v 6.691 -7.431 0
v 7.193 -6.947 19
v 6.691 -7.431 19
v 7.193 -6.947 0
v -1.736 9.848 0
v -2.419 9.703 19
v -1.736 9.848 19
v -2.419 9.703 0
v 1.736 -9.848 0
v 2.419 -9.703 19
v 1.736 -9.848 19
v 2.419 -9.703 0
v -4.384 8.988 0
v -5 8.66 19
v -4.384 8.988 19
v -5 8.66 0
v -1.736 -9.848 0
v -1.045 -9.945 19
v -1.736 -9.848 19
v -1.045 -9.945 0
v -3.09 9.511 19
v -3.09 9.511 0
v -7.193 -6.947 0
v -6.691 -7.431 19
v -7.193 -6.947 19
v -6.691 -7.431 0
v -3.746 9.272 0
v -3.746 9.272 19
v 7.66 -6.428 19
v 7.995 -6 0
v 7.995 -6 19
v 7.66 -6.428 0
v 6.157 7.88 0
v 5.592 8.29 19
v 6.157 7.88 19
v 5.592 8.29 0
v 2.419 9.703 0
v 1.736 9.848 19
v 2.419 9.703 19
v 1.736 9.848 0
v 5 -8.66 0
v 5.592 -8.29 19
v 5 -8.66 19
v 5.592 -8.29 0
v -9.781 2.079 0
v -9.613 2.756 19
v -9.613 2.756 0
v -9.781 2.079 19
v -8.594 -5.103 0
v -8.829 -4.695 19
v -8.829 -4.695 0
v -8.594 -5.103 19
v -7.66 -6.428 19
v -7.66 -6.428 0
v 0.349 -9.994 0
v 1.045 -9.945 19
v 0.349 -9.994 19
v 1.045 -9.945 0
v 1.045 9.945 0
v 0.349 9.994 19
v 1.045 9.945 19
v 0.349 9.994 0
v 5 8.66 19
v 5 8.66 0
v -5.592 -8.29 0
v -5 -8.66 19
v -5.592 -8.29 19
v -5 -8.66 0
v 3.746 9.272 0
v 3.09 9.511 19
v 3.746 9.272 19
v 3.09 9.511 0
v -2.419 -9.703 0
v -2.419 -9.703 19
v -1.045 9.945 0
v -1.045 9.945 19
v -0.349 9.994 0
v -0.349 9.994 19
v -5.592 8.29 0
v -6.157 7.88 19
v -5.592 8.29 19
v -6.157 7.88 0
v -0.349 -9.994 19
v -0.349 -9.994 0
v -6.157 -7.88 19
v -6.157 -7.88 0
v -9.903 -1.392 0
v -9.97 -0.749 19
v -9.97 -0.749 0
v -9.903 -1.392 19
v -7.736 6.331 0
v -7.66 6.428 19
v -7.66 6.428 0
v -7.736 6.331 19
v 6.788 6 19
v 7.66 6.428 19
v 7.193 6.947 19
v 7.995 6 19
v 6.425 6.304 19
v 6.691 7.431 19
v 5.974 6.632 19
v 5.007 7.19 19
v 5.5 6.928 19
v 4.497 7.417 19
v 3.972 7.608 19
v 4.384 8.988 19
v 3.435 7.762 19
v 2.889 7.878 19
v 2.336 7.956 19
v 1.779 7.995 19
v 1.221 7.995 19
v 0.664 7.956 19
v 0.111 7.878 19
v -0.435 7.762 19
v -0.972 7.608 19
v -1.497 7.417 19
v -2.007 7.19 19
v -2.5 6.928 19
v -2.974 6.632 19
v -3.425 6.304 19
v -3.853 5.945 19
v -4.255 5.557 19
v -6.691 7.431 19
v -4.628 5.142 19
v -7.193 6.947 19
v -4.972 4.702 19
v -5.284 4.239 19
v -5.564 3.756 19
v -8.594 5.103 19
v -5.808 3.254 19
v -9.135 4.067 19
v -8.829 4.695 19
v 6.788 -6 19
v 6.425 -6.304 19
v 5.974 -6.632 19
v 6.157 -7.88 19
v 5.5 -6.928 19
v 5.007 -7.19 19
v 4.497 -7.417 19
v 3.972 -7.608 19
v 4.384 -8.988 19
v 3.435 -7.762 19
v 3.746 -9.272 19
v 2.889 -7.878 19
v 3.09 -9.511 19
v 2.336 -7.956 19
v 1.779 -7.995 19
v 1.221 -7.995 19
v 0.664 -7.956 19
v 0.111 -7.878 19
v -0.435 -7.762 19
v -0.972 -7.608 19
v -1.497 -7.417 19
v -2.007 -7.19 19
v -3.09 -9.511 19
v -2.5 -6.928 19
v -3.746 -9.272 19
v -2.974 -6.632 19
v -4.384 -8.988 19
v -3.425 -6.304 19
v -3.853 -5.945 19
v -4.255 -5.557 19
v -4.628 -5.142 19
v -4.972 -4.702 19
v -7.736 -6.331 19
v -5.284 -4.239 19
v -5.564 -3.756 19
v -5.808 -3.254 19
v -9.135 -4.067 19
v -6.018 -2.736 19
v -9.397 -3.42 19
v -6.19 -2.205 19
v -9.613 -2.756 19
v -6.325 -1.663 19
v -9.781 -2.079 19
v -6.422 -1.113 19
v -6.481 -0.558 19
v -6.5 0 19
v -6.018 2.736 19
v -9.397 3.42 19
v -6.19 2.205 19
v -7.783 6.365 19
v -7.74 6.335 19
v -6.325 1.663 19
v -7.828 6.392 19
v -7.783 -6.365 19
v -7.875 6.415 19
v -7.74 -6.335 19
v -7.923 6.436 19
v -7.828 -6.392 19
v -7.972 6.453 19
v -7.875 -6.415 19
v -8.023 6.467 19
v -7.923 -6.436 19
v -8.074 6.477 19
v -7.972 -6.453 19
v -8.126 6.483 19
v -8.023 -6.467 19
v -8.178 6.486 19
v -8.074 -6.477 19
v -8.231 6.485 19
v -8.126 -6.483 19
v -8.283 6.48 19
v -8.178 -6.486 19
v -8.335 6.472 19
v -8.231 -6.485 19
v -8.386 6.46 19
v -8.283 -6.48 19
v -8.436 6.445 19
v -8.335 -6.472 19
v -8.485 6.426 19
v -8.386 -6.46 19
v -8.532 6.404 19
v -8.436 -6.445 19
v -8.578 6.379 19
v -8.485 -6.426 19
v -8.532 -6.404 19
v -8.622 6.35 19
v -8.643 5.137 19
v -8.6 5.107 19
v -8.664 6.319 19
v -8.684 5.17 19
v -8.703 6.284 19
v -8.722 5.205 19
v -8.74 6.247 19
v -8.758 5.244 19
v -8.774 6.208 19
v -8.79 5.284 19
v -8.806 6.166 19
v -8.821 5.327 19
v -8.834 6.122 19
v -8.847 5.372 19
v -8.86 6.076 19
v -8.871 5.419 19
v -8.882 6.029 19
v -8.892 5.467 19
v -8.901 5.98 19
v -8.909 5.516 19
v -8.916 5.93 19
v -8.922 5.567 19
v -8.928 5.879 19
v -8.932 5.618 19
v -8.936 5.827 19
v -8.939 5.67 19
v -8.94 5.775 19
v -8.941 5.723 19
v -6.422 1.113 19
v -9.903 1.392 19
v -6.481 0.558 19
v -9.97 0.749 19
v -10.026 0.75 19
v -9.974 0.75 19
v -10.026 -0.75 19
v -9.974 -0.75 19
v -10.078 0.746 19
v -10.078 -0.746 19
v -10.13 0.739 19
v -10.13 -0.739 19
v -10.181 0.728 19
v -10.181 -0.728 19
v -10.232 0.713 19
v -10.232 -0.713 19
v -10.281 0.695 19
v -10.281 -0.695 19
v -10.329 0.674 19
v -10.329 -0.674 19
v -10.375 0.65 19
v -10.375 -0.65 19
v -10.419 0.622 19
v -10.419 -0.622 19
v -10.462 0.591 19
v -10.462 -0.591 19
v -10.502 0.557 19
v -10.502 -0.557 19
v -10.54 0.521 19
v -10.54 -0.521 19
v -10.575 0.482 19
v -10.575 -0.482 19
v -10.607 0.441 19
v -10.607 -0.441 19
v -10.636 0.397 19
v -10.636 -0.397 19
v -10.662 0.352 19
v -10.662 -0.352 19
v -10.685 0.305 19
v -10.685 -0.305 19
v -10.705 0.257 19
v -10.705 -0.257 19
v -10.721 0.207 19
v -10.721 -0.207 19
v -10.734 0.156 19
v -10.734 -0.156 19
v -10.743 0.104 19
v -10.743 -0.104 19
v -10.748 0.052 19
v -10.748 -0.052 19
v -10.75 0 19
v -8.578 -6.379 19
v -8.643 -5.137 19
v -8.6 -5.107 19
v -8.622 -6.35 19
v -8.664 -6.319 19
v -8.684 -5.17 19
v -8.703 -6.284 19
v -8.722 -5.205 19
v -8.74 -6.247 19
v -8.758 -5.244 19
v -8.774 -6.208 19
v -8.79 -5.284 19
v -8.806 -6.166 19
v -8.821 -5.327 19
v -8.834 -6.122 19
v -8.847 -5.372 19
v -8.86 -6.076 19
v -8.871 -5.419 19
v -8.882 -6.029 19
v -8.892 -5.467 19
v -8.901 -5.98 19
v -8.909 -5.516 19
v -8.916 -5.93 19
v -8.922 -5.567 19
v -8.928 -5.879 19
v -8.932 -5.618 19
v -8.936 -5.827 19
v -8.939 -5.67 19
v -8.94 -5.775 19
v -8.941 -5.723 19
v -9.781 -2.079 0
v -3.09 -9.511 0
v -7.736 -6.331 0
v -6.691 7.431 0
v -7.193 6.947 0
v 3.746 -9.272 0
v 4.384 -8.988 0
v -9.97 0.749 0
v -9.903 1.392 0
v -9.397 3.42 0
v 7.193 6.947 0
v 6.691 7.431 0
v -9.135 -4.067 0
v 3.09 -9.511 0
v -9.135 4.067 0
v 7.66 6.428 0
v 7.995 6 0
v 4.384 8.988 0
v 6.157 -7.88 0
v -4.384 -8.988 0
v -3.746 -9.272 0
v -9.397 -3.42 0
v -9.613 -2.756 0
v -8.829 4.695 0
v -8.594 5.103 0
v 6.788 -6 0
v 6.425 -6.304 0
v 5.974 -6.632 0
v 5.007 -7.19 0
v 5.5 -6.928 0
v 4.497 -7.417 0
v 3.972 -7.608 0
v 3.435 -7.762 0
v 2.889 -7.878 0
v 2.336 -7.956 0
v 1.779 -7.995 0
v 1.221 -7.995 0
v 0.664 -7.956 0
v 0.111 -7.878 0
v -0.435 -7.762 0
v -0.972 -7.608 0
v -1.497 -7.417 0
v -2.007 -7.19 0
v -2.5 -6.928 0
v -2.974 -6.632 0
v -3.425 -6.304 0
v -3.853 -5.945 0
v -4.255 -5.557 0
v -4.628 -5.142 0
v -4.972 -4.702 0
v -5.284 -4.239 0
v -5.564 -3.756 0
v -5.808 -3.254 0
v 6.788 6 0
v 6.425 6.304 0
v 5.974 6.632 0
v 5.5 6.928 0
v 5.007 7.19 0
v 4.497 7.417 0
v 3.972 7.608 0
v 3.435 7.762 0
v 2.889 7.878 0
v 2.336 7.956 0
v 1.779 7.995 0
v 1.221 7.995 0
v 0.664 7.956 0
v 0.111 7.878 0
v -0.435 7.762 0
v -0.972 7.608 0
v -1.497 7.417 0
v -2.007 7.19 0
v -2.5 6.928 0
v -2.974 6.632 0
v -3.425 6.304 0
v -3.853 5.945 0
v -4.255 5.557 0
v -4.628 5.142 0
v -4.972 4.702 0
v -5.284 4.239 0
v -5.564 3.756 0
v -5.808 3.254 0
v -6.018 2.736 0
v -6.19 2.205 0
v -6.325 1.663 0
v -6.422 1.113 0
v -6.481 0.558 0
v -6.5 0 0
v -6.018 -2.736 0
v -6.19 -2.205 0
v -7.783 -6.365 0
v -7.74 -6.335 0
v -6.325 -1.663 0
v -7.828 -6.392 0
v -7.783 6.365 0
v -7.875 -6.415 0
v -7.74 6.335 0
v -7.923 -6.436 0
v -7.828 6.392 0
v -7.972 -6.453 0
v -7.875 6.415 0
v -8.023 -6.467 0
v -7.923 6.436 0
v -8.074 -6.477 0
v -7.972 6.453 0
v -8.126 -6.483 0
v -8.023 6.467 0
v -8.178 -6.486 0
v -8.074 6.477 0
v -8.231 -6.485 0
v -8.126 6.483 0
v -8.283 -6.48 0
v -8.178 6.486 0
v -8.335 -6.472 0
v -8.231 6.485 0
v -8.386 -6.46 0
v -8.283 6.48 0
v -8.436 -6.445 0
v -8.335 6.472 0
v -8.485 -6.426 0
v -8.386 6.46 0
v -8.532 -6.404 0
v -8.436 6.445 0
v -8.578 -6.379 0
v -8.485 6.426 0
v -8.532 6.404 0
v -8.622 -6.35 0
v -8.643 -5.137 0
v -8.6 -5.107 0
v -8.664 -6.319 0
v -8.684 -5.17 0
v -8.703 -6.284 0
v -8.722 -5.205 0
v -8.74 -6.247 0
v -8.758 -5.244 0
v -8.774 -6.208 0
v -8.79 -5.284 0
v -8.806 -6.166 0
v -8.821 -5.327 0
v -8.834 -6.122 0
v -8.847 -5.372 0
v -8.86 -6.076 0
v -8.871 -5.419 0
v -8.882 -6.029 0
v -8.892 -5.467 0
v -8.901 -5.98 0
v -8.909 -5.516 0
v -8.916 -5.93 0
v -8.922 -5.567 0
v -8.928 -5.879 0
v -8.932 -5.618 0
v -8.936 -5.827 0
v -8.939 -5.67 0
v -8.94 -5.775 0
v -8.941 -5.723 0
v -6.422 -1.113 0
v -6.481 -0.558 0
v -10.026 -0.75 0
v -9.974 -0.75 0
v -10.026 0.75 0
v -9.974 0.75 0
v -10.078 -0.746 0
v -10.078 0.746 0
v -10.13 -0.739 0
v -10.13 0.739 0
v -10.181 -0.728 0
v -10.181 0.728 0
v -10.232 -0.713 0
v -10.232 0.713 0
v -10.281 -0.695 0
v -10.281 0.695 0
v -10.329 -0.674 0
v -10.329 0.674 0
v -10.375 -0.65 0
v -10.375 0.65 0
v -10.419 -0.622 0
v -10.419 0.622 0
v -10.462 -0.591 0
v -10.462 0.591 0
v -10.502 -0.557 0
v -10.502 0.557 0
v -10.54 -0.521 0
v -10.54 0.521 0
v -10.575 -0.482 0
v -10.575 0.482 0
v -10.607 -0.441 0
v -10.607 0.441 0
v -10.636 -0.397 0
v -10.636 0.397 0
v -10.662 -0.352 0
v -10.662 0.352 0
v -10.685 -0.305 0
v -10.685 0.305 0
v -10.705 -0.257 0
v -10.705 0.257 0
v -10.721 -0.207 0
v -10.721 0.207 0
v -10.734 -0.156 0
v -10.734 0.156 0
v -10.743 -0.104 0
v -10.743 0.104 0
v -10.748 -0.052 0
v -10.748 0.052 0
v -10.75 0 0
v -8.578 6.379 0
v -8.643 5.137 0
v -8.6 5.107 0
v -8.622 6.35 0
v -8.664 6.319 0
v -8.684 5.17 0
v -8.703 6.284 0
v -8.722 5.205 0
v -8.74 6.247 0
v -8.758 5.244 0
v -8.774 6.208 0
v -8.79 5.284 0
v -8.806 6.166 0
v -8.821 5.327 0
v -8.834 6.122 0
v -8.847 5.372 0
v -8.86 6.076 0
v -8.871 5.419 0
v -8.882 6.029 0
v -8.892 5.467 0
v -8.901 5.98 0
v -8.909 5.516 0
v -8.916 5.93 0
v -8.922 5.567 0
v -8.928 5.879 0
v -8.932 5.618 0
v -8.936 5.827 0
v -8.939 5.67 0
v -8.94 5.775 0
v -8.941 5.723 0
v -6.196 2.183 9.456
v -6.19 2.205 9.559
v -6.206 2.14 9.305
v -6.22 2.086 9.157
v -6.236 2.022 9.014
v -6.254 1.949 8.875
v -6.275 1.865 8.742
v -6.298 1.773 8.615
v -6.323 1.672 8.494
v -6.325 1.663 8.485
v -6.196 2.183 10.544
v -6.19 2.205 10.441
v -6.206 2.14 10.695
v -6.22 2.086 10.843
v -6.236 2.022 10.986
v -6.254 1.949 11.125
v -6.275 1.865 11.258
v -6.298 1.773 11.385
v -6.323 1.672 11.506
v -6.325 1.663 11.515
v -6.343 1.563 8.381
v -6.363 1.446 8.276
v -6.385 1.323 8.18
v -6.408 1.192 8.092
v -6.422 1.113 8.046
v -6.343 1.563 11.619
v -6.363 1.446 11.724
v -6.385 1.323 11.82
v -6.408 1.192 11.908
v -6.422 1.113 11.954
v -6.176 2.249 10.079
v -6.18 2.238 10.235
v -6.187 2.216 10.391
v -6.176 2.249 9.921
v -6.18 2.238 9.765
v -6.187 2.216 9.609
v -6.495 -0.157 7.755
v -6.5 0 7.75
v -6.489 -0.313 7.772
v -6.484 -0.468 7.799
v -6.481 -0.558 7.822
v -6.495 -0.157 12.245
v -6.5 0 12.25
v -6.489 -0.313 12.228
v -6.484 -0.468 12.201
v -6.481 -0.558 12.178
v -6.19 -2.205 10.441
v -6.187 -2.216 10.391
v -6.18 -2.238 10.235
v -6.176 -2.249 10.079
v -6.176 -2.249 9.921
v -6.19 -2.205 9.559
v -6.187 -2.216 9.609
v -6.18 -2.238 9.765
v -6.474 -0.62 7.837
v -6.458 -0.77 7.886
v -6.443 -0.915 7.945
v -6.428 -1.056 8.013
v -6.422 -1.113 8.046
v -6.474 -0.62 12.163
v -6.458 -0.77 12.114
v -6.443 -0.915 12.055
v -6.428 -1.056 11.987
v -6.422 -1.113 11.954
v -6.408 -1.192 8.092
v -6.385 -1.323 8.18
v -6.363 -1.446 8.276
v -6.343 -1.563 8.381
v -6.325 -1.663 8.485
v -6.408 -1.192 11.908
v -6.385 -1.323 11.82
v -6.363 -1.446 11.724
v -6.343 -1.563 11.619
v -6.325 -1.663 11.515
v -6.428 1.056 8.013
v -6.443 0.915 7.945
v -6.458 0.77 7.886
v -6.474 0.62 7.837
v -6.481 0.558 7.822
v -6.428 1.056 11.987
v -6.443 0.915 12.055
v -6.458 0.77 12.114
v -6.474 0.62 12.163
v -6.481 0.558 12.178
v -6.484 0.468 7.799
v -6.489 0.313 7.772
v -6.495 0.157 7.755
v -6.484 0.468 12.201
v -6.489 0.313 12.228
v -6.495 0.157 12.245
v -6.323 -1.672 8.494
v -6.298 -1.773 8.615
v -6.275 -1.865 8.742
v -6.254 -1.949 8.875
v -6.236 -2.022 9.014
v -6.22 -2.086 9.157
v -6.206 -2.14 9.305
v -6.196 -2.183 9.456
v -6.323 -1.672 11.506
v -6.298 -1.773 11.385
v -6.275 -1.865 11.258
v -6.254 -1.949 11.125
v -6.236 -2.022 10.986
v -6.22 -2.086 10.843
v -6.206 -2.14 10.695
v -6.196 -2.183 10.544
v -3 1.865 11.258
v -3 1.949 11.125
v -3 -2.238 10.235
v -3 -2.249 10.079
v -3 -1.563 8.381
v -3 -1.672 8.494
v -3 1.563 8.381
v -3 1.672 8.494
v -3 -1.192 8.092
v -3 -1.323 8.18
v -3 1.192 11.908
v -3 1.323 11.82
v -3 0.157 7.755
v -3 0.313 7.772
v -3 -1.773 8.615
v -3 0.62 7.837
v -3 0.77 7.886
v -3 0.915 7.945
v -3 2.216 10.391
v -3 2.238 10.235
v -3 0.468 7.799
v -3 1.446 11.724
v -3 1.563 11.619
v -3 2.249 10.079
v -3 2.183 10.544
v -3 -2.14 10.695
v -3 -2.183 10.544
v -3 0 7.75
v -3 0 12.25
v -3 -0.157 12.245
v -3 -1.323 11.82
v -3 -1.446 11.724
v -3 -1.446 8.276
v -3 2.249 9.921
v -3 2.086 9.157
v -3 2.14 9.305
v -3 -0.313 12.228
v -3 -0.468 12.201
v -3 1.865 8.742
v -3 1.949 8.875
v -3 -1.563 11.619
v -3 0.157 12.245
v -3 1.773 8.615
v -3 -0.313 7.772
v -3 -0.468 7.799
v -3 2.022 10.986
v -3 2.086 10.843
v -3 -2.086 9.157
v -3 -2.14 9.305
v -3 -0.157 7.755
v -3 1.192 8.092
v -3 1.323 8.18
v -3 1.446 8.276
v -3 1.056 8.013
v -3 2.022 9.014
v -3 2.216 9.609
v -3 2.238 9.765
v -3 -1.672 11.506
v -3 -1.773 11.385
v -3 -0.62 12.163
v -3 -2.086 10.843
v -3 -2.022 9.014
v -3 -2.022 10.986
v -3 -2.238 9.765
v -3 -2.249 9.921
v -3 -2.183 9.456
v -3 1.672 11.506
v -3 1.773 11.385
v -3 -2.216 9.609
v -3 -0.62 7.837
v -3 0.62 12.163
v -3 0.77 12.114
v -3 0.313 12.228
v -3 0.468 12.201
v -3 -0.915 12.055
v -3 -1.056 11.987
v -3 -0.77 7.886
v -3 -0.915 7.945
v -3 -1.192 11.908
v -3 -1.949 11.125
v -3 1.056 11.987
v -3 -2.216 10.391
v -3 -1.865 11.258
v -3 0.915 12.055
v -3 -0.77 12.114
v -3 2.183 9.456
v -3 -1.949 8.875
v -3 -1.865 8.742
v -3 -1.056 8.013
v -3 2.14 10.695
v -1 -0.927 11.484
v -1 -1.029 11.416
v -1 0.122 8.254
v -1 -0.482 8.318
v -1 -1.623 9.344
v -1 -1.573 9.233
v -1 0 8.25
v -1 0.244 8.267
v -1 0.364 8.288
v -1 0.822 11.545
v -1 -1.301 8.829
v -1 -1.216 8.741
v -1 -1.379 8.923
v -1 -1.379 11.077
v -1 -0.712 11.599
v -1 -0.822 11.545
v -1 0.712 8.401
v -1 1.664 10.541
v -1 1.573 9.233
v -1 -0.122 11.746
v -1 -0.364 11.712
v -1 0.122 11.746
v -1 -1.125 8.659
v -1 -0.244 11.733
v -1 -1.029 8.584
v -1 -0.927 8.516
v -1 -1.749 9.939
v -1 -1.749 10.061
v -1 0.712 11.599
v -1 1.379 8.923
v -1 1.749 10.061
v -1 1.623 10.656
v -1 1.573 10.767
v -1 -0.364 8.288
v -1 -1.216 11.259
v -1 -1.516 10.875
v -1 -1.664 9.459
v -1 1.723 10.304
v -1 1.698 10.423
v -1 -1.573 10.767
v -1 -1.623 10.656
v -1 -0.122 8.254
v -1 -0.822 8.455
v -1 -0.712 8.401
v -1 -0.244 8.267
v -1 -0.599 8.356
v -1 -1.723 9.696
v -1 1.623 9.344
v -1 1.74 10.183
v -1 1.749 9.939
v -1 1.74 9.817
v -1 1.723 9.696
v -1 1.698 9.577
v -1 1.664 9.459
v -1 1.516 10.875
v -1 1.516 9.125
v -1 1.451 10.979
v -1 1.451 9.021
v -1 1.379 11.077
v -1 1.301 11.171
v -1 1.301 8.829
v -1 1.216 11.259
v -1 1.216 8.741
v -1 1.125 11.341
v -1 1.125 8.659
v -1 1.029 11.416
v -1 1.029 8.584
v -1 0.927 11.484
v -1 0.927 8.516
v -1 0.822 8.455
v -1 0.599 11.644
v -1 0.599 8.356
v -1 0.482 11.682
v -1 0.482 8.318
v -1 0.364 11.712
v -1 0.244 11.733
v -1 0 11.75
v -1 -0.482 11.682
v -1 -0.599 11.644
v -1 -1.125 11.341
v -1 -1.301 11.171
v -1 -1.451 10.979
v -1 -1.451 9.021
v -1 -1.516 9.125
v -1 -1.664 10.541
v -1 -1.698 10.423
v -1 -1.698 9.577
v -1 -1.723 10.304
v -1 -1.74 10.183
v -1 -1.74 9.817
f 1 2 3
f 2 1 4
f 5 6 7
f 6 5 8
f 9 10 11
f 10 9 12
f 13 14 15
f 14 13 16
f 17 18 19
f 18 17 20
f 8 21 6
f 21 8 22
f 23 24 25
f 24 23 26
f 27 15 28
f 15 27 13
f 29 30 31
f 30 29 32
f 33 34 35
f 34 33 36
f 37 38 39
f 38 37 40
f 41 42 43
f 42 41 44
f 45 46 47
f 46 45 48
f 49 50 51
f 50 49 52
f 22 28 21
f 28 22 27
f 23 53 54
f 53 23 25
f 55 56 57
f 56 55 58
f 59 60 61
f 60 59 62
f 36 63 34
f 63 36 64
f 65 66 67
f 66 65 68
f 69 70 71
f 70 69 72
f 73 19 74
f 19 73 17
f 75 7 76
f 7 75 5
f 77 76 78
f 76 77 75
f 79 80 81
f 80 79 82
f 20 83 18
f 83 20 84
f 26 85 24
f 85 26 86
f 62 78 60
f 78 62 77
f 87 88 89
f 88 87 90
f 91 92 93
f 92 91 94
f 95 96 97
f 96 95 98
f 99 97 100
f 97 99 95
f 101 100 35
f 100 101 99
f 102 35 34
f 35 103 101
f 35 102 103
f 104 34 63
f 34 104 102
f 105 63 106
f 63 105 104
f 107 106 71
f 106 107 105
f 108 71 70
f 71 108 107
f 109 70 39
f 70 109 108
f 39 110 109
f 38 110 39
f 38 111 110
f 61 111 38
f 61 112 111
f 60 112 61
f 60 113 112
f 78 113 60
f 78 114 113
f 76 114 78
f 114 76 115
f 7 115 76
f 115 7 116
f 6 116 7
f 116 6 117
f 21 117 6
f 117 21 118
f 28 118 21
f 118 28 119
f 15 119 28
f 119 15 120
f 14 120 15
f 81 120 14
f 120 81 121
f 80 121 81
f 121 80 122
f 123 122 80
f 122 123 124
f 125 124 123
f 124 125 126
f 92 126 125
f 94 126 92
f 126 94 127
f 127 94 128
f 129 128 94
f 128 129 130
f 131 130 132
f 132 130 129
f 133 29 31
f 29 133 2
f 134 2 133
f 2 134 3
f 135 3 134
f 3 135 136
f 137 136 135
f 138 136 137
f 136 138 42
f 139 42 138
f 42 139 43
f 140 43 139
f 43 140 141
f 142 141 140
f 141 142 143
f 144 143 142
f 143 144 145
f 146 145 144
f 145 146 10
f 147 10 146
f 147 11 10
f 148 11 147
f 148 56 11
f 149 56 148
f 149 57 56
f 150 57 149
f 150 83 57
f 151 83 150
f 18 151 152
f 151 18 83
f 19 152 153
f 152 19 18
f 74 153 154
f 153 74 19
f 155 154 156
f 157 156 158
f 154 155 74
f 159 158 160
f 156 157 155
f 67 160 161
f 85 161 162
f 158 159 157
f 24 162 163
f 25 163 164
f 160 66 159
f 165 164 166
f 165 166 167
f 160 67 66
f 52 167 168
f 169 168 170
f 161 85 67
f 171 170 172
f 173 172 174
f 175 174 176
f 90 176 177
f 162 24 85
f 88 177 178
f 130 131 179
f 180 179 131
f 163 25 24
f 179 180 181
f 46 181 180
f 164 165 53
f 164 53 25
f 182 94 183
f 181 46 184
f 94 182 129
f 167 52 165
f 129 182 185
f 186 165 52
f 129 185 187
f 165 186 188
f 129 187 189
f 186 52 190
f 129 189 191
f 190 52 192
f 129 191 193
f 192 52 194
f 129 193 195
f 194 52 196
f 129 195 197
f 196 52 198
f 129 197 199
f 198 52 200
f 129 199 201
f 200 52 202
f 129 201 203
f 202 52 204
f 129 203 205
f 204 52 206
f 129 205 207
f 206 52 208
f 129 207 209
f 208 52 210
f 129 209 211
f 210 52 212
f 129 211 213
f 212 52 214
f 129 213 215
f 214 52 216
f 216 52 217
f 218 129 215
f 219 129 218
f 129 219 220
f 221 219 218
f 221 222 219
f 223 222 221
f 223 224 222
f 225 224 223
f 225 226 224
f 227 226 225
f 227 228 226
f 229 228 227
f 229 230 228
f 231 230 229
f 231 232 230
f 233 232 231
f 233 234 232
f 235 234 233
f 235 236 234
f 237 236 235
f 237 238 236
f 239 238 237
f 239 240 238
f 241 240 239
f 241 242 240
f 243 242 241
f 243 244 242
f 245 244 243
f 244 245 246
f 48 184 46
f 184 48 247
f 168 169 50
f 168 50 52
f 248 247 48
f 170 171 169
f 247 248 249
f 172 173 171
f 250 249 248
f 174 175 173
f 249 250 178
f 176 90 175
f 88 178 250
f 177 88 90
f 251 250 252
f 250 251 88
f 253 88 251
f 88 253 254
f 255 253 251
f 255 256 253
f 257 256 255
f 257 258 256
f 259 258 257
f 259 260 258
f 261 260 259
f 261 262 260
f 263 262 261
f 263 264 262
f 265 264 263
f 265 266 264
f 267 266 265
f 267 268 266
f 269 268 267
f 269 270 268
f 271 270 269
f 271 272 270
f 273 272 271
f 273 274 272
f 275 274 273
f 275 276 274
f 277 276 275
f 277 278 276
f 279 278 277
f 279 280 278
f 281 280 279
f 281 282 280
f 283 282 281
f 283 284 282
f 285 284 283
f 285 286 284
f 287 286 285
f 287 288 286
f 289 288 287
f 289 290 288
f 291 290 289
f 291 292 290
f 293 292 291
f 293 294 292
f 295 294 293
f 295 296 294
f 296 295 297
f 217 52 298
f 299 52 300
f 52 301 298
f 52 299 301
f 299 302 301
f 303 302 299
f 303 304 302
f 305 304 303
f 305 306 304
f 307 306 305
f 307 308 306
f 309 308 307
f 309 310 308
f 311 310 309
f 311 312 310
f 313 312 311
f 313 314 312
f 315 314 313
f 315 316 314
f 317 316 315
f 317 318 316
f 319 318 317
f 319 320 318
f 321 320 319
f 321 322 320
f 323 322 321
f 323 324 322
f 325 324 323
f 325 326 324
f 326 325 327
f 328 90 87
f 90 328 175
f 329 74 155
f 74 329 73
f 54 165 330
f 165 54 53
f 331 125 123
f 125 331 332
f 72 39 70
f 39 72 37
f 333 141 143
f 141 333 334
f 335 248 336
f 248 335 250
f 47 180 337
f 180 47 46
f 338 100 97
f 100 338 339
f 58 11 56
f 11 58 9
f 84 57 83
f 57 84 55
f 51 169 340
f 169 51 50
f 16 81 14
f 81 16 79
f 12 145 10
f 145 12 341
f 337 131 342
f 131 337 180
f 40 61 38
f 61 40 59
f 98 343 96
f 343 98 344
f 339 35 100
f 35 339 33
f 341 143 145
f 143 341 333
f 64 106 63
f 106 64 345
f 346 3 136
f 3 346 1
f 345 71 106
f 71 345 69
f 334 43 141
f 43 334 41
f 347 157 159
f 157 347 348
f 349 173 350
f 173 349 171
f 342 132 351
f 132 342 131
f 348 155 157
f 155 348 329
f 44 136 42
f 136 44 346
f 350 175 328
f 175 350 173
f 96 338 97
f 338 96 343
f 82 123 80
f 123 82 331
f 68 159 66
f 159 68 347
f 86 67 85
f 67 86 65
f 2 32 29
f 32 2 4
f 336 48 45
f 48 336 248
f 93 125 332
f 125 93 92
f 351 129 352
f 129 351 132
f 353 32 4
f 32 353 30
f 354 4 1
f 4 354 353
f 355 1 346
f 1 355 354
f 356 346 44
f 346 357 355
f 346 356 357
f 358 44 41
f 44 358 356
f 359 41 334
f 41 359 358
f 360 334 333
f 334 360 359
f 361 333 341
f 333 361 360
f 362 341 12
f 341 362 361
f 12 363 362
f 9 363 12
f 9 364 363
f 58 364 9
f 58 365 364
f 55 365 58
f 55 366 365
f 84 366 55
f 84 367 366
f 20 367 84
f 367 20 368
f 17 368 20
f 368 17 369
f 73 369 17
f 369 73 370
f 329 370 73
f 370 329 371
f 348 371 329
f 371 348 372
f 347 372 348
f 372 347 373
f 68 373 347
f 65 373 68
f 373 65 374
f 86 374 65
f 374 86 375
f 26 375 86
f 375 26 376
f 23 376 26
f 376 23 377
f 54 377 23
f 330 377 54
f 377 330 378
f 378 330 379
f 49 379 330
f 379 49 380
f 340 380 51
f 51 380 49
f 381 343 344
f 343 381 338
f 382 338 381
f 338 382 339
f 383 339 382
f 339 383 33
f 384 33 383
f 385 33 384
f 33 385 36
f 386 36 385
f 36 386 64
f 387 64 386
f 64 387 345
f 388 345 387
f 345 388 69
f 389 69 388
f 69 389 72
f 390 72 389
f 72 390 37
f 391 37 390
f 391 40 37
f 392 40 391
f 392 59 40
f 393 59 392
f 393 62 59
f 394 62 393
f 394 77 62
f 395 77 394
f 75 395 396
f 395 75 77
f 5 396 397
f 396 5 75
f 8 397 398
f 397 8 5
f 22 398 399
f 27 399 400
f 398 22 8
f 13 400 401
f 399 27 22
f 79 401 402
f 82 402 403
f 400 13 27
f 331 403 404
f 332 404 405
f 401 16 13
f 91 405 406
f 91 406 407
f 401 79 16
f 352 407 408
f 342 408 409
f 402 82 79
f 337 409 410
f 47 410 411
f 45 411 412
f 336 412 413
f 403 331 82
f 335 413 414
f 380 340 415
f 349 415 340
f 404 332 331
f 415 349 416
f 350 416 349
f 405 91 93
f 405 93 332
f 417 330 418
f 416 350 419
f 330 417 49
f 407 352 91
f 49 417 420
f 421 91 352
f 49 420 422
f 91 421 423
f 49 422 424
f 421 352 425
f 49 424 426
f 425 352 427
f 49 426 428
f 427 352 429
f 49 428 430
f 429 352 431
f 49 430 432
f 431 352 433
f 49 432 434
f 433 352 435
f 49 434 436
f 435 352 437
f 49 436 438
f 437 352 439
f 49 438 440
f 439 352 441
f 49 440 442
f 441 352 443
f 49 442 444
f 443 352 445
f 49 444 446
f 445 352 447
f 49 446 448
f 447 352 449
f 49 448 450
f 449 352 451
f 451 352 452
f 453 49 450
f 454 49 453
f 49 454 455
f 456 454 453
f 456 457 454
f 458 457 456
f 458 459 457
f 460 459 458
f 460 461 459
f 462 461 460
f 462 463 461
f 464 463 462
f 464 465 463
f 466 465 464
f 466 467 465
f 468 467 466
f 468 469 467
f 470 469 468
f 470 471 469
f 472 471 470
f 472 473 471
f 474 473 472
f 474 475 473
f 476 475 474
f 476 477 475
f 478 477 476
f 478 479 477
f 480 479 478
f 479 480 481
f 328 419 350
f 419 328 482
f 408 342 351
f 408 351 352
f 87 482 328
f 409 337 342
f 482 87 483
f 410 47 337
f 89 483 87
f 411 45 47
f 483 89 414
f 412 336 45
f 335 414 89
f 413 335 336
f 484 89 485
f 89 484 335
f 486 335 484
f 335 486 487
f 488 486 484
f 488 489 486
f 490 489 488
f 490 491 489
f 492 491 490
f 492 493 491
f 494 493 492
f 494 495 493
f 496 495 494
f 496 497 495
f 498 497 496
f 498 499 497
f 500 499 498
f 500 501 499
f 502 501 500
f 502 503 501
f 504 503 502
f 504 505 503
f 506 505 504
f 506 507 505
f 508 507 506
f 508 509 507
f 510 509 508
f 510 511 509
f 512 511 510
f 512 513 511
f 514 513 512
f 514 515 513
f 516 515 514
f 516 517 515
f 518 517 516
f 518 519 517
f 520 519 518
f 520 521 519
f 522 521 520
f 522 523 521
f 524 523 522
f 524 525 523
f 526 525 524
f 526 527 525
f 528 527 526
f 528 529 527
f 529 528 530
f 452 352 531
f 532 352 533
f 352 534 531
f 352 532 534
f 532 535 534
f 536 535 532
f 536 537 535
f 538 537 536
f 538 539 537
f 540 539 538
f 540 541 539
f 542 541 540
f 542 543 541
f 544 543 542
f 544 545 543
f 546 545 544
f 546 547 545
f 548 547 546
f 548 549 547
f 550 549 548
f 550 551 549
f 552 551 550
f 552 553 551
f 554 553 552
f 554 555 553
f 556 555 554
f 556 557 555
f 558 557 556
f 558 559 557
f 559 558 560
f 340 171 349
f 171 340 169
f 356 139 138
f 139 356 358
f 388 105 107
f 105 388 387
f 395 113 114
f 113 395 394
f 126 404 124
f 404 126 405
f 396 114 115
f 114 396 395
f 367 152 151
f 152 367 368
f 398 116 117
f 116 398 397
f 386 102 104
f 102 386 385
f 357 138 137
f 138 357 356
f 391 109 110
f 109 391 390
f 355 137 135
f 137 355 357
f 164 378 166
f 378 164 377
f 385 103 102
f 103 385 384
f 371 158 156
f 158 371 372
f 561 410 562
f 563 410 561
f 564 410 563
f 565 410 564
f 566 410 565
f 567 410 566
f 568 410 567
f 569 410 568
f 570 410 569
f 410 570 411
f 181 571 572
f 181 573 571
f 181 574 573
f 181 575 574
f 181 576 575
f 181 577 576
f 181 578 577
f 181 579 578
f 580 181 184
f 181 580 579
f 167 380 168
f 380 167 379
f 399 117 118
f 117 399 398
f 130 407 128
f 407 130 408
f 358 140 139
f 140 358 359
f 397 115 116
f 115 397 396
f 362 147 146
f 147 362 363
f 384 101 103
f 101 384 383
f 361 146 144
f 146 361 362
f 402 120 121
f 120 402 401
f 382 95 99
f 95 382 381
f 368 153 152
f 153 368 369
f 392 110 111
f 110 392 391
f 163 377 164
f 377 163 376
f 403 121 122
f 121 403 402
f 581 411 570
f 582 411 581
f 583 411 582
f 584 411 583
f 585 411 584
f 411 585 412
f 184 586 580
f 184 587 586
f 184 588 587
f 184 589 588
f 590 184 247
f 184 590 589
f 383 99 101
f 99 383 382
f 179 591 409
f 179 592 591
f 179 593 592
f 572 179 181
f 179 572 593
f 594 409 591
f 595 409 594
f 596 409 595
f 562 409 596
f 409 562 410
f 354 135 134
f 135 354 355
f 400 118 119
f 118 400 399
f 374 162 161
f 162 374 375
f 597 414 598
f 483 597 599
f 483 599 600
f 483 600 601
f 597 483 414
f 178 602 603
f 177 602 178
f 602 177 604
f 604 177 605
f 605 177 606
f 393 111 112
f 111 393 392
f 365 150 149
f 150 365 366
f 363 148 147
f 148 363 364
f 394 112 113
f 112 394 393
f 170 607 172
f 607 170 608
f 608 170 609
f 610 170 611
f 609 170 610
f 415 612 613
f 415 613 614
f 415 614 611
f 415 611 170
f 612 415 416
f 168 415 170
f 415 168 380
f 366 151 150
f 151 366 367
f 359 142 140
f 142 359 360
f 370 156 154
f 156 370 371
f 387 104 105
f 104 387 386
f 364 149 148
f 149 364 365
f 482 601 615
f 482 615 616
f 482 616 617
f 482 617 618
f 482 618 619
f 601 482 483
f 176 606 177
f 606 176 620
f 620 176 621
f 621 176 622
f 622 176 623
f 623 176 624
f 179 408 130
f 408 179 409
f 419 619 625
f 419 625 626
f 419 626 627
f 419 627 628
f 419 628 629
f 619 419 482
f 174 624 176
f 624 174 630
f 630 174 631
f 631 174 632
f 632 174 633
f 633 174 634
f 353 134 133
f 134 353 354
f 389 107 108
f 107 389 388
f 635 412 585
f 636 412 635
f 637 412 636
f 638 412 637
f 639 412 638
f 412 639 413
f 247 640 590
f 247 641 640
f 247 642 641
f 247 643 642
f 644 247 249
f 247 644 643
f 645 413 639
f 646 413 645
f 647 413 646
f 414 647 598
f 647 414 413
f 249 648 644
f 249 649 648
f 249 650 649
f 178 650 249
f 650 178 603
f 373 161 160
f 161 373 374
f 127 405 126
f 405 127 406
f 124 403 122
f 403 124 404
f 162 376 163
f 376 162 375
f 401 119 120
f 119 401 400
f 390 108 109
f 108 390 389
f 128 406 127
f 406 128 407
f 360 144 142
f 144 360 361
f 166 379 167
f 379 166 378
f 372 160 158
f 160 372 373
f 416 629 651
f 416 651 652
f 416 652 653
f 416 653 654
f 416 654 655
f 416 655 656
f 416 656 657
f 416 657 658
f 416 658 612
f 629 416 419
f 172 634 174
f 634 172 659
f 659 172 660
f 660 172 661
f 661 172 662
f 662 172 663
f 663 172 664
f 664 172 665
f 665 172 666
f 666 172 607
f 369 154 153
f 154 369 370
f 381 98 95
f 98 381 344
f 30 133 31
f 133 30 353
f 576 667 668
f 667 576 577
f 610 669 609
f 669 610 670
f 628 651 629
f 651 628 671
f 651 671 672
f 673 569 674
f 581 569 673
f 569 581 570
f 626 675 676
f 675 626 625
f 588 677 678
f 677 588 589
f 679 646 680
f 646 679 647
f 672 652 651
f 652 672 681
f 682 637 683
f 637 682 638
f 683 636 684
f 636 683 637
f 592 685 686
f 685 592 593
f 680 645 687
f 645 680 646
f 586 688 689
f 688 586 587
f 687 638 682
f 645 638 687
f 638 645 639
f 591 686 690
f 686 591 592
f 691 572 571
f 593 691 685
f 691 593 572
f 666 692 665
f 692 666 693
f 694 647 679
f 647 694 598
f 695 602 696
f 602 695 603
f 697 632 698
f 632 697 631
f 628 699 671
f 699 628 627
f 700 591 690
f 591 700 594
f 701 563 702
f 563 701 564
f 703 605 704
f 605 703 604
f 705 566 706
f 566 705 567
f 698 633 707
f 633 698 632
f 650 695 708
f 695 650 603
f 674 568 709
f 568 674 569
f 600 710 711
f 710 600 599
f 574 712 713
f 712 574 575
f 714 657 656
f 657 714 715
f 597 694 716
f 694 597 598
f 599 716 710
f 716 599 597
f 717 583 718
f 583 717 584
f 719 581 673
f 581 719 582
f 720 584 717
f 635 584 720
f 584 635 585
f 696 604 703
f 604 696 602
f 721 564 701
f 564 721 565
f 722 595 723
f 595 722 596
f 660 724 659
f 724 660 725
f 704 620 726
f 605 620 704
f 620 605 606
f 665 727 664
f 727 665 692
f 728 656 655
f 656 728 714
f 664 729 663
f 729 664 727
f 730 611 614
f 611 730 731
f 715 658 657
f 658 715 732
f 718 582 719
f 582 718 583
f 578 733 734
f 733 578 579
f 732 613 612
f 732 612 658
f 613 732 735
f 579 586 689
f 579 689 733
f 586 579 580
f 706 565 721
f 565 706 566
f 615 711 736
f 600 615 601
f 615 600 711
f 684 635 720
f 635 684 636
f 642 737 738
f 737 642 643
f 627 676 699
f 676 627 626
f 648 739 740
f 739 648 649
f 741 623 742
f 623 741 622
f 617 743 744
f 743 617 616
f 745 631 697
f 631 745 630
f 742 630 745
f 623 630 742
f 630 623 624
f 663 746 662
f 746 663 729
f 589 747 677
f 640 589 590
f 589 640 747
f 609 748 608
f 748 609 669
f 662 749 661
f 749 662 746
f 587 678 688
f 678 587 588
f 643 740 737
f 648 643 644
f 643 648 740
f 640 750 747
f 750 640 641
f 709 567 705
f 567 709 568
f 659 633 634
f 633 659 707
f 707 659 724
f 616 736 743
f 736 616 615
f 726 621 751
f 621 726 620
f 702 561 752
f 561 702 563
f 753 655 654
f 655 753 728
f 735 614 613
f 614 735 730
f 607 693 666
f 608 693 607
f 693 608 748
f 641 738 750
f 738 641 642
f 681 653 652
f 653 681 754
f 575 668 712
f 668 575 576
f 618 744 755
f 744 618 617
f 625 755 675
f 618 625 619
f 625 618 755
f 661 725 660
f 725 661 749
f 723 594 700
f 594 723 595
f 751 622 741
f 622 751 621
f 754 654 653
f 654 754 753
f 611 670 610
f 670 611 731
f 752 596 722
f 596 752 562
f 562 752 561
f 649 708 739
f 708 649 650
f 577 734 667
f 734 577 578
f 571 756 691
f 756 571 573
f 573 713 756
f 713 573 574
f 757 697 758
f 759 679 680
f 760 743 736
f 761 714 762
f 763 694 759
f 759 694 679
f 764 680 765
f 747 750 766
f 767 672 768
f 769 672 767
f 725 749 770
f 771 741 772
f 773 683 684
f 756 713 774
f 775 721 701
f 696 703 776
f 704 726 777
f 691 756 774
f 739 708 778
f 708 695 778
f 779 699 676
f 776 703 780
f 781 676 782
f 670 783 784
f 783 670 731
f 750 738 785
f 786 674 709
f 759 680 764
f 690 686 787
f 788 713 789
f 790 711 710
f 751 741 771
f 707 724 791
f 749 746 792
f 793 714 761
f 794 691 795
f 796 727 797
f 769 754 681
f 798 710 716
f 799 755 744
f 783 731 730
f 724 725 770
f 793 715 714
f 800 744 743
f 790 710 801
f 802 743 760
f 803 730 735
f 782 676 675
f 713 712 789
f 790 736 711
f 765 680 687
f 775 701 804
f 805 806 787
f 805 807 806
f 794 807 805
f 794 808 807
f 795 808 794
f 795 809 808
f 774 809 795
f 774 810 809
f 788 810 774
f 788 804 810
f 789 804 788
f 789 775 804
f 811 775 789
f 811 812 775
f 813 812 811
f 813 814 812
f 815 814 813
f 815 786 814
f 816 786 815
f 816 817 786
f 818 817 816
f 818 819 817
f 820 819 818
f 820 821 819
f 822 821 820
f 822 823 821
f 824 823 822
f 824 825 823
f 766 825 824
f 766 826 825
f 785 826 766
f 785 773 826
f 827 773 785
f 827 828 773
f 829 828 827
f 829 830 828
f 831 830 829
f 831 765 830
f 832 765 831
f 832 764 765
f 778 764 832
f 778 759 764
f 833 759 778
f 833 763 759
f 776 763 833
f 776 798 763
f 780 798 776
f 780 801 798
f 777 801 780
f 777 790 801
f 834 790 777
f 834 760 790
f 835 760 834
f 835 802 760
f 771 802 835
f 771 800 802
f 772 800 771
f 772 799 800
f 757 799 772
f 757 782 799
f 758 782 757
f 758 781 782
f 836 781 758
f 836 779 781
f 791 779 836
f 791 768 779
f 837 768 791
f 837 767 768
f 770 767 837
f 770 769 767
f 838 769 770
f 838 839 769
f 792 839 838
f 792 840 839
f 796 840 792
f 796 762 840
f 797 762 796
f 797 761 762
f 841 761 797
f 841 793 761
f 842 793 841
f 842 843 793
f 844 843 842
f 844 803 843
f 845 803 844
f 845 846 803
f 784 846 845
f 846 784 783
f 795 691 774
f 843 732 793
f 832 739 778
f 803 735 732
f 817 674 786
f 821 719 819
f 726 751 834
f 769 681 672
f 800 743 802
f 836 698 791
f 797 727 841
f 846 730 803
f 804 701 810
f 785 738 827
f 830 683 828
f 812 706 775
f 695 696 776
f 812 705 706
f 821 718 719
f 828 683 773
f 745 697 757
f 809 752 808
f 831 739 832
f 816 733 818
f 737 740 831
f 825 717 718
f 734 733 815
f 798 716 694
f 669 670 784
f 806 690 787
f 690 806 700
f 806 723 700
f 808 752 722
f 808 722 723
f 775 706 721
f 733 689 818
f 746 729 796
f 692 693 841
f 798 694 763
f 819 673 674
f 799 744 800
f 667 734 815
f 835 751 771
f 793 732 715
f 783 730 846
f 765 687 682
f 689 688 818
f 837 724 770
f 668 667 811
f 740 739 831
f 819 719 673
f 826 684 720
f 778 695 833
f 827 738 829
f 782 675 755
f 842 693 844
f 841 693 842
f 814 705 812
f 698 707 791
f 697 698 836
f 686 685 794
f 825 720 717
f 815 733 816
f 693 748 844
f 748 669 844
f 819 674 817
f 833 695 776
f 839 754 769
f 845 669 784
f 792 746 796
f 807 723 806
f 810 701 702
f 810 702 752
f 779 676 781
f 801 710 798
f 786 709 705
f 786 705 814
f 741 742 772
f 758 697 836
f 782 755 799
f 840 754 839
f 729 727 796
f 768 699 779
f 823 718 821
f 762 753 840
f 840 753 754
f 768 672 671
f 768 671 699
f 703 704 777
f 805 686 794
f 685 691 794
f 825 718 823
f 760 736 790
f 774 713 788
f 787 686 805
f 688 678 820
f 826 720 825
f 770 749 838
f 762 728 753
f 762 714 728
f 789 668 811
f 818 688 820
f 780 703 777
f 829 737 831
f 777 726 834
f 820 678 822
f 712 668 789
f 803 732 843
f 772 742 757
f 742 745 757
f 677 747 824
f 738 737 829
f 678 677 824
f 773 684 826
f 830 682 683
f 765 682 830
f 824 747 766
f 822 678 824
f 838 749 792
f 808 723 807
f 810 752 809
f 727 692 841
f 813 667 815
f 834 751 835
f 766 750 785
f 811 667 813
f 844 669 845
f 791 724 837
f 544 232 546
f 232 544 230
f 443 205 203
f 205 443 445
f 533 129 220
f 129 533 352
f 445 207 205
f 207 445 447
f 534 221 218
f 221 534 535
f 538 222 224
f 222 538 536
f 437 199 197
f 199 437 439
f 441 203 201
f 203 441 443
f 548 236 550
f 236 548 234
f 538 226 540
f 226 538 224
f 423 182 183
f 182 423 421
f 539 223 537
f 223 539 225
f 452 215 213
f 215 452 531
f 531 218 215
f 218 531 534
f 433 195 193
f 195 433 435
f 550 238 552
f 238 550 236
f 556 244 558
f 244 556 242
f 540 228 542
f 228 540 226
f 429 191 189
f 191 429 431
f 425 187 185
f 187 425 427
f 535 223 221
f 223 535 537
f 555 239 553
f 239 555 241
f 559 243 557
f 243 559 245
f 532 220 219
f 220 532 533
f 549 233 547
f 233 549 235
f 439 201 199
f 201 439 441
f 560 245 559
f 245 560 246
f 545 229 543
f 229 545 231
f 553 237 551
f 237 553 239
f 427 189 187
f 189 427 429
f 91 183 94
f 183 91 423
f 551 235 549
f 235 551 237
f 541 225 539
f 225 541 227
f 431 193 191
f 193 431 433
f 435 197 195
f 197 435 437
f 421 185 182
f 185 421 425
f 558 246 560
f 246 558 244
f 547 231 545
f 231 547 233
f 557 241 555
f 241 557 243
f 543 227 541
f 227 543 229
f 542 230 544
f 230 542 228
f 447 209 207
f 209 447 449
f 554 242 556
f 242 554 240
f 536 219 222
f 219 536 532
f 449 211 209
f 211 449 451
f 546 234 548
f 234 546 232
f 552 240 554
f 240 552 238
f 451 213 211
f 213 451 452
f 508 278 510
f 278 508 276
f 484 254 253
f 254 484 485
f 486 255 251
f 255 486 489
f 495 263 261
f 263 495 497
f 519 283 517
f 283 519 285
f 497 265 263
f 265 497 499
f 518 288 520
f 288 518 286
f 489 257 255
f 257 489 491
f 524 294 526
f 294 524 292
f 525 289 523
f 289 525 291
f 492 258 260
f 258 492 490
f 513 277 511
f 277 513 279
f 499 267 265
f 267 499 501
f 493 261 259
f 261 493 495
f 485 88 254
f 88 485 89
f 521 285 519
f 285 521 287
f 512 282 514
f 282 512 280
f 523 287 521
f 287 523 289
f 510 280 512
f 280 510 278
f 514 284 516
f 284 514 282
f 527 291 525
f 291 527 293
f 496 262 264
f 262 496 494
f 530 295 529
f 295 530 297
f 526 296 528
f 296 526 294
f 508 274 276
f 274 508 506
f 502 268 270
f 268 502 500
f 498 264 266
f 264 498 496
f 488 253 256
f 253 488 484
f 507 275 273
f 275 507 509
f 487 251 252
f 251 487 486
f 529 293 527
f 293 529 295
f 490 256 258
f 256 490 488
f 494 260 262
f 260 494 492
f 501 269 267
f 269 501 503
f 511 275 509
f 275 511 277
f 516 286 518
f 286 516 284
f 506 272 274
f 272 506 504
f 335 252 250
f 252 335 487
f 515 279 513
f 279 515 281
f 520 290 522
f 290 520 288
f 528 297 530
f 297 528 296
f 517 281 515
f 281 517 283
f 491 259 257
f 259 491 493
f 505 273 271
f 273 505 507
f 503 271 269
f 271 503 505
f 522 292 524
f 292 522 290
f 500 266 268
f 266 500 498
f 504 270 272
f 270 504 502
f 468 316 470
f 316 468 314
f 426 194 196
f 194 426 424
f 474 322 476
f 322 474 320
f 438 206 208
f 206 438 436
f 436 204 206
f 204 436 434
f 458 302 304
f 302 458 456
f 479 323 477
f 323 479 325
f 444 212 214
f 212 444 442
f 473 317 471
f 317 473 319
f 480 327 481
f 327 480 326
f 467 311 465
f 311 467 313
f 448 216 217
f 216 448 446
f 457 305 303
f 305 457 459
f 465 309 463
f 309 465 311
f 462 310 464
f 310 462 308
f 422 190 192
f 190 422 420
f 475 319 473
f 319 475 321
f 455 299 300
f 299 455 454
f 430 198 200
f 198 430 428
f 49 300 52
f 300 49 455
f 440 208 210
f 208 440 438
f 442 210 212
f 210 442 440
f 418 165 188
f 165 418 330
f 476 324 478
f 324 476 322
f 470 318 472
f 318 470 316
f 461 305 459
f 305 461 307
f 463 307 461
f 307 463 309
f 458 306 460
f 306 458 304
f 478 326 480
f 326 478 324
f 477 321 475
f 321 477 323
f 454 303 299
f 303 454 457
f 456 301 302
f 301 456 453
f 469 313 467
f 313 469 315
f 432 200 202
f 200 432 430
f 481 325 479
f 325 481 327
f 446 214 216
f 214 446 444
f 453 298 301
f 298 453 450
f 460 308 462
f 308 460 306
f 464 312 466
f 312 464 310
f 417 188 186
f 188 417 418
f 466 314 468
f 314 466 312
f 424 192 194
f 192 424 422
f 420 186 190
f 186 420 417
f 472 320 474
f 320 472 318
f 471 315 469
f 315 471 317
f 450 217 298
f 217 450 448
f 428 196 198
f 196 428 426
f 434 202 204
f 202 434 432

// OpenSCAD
// general purpose parameters
eps = 0.01;
$fn = 90;

// foot parameters
// height
h = 19;
// outer diameter
D = 20;
// inner diameter 
d = 16;
// center offset
off = 3/2;
// length of the cut
l = 12;

// vertical cylinder parameters
// diameter
vc_d = 4.5;
// height
vc_h = 5.5;

// cylinders increasing friction parameters
cf_d = 1.5;
// cylinders angles
cf_a = 35;

module foot()
{
    difference()
    {
        // main shape
        cylinder(d=D, h=h);
        
        // inner cut
        translate([off,0,-eps])
            cylinder(d=d, h=h+2*eps);
        
        // cut for inserting the dryer leg
        translate([0,-l/2,-eps])
            cube([D/2,l,h+2*eps]);
    }
    
    // vertical cylinder
    translate([-d/2+off,0,D/2])
    rotate([0,90,0])
    translate([0,0,-1])
    {
        // base
        cylinder(h=vc_h-1, d=vc_d);
        // tip
        translate([0,0,vc_h-1])
            cylinder(h=2, d1=vc_d, d2=vc_d-1);
        //%translate([0,0,1])
        //    cylinder(h=vc_h,d=vc_d);
    }
    
    // cylinder increasing friction
    for(a=[-cf_a,0,cf_a])
    {
        rotate([0,0,a])
            translate([-D/2,0,0])
                cylinder(d=cf_d, h=h);
    }
}

foot();
